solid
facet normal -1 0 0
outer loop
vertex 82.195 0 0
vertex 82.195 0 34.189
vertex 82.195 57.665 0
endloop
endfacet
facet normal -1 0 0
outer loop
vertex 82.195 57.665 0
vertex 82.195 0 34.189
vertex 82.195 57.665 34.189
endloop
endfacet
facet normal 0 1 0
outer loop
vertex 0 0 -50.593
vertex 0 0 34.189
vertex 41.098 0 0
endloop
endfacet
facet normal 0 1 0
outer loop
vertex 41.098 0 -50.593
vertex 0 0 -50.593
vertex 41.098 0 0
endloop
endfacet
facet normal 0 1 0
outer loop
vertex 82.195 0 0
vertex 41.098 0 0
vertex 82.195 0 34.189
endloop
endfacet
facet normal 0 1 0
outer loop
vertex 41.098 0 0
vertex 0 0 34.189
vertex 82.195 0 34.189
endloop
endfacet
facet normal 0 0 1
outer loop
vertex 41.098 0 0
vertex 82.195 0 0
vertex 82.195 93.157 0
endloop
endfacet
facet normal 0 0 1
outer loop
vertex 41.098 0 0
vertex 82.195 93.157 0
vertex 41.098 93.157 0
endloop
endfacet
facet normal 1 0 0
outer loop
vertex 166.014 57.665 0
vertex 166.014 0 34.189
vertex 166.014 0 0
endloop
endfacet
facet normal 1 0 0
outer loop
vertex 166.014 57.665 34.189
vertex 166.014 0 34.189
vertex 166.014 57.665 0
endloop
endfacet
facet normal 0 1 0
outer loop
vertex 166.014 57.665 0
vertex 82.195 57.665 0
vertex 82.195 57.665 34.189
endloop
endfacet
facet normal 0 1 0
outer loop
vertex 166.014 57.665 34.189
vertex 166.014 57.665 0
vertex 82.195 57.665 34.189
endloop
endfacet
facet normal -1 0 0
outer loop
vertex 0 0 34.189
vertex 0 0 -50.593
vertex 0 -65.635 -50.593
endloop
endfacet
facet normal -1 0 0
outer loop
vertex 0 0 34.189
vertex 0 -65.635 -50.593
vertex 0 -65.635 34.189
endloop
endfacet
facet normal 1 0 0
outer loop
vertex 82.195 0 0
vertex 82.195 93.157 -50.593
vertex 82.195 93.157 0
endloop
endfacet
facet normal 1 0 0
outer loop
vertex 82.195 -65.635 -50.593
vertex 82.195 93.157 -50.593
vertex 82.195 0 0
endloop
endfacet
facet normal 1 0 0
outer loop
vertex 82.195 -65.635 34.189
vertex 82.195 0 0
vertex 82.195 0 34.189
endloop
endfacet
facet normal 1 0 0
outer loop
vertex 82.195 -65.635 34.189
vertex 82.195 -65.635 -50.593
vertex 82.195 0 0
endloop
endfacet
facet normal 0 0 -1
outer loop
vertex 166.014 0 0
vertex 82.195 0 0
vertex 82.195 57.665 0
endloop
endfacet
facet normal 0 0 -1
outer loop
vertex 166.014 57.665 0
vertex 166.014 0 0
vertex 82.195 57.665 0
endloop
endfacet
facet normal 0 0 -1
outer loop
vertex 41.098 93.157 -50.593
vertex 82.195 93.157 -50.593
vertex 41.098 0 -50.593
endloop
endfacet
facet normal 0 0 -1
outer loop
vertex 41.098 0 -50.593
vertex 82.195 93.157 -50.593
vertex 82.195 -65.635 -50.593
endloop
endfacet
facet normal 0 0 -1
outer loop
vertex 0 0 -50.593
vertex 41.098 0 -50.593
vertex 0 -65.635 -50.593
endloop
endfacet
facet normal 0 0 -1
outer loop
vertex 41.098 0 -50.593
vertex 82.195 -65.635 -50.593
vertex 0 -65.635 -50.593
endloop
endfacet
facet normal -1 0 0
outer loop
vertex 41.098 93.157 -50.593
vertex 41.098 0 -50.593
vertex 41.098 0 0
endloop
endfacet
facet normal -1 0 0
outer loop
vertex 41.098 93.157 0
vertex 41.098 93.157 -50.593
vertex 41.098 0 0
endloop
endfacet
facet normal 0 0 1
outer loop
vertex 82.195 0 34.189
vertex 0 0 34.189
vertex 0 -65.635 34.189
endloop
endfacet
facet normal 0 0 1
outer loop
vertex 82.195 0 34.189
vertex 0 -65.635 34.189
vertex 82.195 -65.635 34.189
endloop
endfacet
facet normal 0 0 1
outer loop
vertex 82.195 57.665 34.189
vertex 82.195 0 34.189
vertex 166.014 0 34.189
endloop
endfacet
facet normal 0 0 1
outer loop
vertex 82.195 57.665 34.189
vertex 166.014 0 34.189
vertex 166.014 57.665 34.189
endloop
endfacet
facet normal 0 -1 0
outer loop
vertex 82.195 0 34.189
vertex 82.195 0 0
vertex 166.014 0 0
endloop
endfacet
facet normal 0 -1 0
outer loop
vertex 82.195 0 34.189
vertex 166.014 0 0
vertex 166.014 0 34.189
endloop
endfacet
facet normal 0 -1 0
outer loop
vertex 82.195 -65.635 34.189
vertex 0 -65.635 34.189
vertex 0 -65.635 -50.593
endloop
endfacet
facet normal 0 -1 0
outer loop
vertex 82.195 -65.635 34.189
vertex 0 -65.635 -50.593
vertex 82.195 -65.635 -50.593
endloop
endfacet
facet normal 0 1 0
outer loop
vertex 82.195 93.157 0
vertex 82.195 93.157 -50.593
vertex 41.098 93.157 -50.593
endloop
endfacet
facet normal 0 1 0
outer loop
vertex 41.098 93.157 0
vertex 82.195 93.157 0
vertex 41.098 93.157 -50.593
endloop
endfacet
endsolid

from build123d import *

# Parameters (mm, degrees)
F0_W     = 82.195289433
F0_H     = 84.7819373012
F1_DEPTH = 65.6348839402
F2_W     = 41.0976447165
F2_H     = 50.5926012993
F3_DEPTH = 93.1568071246
F4_W     = 57.664565742
F4_H     = 34.1893360019
F5_DEPTH = 83.8187858462


with BuildPart() as f1:
    # F0 (on Front) → F1 (new body)
    with BuildSketch(Plane.XZ):
        with Locations((41.0976447165, -8.2016326487)):
            Rectangle(F0_W, F0_H)
    extrude(amount=F1_DEPTH)

    # F2 (on face) → F3 (join)
    with BuildSketch(Plane(origin=(0, 0, 0), x_dir=(-1, 0, 0), z_dir=(0, 1, 0))):
        with Locations((-61.6464670748, -25.2963006496)):
            Rectangle(F2_W, F2_H)
    extrude(amount=F3_DEPTH)


with BuildPart() as f5:
    # F4 (on face) → F5 (new body)
    with BuildSketch(Plane.YZ.offset(82.195289433)):
        with Locations((28.832282871, 17.0946680009)):
            Rectangle(F4_W, F4_H)
    extrude(amount=F5_DEPTH)


solid = Compound([f1.part, f5.part])
